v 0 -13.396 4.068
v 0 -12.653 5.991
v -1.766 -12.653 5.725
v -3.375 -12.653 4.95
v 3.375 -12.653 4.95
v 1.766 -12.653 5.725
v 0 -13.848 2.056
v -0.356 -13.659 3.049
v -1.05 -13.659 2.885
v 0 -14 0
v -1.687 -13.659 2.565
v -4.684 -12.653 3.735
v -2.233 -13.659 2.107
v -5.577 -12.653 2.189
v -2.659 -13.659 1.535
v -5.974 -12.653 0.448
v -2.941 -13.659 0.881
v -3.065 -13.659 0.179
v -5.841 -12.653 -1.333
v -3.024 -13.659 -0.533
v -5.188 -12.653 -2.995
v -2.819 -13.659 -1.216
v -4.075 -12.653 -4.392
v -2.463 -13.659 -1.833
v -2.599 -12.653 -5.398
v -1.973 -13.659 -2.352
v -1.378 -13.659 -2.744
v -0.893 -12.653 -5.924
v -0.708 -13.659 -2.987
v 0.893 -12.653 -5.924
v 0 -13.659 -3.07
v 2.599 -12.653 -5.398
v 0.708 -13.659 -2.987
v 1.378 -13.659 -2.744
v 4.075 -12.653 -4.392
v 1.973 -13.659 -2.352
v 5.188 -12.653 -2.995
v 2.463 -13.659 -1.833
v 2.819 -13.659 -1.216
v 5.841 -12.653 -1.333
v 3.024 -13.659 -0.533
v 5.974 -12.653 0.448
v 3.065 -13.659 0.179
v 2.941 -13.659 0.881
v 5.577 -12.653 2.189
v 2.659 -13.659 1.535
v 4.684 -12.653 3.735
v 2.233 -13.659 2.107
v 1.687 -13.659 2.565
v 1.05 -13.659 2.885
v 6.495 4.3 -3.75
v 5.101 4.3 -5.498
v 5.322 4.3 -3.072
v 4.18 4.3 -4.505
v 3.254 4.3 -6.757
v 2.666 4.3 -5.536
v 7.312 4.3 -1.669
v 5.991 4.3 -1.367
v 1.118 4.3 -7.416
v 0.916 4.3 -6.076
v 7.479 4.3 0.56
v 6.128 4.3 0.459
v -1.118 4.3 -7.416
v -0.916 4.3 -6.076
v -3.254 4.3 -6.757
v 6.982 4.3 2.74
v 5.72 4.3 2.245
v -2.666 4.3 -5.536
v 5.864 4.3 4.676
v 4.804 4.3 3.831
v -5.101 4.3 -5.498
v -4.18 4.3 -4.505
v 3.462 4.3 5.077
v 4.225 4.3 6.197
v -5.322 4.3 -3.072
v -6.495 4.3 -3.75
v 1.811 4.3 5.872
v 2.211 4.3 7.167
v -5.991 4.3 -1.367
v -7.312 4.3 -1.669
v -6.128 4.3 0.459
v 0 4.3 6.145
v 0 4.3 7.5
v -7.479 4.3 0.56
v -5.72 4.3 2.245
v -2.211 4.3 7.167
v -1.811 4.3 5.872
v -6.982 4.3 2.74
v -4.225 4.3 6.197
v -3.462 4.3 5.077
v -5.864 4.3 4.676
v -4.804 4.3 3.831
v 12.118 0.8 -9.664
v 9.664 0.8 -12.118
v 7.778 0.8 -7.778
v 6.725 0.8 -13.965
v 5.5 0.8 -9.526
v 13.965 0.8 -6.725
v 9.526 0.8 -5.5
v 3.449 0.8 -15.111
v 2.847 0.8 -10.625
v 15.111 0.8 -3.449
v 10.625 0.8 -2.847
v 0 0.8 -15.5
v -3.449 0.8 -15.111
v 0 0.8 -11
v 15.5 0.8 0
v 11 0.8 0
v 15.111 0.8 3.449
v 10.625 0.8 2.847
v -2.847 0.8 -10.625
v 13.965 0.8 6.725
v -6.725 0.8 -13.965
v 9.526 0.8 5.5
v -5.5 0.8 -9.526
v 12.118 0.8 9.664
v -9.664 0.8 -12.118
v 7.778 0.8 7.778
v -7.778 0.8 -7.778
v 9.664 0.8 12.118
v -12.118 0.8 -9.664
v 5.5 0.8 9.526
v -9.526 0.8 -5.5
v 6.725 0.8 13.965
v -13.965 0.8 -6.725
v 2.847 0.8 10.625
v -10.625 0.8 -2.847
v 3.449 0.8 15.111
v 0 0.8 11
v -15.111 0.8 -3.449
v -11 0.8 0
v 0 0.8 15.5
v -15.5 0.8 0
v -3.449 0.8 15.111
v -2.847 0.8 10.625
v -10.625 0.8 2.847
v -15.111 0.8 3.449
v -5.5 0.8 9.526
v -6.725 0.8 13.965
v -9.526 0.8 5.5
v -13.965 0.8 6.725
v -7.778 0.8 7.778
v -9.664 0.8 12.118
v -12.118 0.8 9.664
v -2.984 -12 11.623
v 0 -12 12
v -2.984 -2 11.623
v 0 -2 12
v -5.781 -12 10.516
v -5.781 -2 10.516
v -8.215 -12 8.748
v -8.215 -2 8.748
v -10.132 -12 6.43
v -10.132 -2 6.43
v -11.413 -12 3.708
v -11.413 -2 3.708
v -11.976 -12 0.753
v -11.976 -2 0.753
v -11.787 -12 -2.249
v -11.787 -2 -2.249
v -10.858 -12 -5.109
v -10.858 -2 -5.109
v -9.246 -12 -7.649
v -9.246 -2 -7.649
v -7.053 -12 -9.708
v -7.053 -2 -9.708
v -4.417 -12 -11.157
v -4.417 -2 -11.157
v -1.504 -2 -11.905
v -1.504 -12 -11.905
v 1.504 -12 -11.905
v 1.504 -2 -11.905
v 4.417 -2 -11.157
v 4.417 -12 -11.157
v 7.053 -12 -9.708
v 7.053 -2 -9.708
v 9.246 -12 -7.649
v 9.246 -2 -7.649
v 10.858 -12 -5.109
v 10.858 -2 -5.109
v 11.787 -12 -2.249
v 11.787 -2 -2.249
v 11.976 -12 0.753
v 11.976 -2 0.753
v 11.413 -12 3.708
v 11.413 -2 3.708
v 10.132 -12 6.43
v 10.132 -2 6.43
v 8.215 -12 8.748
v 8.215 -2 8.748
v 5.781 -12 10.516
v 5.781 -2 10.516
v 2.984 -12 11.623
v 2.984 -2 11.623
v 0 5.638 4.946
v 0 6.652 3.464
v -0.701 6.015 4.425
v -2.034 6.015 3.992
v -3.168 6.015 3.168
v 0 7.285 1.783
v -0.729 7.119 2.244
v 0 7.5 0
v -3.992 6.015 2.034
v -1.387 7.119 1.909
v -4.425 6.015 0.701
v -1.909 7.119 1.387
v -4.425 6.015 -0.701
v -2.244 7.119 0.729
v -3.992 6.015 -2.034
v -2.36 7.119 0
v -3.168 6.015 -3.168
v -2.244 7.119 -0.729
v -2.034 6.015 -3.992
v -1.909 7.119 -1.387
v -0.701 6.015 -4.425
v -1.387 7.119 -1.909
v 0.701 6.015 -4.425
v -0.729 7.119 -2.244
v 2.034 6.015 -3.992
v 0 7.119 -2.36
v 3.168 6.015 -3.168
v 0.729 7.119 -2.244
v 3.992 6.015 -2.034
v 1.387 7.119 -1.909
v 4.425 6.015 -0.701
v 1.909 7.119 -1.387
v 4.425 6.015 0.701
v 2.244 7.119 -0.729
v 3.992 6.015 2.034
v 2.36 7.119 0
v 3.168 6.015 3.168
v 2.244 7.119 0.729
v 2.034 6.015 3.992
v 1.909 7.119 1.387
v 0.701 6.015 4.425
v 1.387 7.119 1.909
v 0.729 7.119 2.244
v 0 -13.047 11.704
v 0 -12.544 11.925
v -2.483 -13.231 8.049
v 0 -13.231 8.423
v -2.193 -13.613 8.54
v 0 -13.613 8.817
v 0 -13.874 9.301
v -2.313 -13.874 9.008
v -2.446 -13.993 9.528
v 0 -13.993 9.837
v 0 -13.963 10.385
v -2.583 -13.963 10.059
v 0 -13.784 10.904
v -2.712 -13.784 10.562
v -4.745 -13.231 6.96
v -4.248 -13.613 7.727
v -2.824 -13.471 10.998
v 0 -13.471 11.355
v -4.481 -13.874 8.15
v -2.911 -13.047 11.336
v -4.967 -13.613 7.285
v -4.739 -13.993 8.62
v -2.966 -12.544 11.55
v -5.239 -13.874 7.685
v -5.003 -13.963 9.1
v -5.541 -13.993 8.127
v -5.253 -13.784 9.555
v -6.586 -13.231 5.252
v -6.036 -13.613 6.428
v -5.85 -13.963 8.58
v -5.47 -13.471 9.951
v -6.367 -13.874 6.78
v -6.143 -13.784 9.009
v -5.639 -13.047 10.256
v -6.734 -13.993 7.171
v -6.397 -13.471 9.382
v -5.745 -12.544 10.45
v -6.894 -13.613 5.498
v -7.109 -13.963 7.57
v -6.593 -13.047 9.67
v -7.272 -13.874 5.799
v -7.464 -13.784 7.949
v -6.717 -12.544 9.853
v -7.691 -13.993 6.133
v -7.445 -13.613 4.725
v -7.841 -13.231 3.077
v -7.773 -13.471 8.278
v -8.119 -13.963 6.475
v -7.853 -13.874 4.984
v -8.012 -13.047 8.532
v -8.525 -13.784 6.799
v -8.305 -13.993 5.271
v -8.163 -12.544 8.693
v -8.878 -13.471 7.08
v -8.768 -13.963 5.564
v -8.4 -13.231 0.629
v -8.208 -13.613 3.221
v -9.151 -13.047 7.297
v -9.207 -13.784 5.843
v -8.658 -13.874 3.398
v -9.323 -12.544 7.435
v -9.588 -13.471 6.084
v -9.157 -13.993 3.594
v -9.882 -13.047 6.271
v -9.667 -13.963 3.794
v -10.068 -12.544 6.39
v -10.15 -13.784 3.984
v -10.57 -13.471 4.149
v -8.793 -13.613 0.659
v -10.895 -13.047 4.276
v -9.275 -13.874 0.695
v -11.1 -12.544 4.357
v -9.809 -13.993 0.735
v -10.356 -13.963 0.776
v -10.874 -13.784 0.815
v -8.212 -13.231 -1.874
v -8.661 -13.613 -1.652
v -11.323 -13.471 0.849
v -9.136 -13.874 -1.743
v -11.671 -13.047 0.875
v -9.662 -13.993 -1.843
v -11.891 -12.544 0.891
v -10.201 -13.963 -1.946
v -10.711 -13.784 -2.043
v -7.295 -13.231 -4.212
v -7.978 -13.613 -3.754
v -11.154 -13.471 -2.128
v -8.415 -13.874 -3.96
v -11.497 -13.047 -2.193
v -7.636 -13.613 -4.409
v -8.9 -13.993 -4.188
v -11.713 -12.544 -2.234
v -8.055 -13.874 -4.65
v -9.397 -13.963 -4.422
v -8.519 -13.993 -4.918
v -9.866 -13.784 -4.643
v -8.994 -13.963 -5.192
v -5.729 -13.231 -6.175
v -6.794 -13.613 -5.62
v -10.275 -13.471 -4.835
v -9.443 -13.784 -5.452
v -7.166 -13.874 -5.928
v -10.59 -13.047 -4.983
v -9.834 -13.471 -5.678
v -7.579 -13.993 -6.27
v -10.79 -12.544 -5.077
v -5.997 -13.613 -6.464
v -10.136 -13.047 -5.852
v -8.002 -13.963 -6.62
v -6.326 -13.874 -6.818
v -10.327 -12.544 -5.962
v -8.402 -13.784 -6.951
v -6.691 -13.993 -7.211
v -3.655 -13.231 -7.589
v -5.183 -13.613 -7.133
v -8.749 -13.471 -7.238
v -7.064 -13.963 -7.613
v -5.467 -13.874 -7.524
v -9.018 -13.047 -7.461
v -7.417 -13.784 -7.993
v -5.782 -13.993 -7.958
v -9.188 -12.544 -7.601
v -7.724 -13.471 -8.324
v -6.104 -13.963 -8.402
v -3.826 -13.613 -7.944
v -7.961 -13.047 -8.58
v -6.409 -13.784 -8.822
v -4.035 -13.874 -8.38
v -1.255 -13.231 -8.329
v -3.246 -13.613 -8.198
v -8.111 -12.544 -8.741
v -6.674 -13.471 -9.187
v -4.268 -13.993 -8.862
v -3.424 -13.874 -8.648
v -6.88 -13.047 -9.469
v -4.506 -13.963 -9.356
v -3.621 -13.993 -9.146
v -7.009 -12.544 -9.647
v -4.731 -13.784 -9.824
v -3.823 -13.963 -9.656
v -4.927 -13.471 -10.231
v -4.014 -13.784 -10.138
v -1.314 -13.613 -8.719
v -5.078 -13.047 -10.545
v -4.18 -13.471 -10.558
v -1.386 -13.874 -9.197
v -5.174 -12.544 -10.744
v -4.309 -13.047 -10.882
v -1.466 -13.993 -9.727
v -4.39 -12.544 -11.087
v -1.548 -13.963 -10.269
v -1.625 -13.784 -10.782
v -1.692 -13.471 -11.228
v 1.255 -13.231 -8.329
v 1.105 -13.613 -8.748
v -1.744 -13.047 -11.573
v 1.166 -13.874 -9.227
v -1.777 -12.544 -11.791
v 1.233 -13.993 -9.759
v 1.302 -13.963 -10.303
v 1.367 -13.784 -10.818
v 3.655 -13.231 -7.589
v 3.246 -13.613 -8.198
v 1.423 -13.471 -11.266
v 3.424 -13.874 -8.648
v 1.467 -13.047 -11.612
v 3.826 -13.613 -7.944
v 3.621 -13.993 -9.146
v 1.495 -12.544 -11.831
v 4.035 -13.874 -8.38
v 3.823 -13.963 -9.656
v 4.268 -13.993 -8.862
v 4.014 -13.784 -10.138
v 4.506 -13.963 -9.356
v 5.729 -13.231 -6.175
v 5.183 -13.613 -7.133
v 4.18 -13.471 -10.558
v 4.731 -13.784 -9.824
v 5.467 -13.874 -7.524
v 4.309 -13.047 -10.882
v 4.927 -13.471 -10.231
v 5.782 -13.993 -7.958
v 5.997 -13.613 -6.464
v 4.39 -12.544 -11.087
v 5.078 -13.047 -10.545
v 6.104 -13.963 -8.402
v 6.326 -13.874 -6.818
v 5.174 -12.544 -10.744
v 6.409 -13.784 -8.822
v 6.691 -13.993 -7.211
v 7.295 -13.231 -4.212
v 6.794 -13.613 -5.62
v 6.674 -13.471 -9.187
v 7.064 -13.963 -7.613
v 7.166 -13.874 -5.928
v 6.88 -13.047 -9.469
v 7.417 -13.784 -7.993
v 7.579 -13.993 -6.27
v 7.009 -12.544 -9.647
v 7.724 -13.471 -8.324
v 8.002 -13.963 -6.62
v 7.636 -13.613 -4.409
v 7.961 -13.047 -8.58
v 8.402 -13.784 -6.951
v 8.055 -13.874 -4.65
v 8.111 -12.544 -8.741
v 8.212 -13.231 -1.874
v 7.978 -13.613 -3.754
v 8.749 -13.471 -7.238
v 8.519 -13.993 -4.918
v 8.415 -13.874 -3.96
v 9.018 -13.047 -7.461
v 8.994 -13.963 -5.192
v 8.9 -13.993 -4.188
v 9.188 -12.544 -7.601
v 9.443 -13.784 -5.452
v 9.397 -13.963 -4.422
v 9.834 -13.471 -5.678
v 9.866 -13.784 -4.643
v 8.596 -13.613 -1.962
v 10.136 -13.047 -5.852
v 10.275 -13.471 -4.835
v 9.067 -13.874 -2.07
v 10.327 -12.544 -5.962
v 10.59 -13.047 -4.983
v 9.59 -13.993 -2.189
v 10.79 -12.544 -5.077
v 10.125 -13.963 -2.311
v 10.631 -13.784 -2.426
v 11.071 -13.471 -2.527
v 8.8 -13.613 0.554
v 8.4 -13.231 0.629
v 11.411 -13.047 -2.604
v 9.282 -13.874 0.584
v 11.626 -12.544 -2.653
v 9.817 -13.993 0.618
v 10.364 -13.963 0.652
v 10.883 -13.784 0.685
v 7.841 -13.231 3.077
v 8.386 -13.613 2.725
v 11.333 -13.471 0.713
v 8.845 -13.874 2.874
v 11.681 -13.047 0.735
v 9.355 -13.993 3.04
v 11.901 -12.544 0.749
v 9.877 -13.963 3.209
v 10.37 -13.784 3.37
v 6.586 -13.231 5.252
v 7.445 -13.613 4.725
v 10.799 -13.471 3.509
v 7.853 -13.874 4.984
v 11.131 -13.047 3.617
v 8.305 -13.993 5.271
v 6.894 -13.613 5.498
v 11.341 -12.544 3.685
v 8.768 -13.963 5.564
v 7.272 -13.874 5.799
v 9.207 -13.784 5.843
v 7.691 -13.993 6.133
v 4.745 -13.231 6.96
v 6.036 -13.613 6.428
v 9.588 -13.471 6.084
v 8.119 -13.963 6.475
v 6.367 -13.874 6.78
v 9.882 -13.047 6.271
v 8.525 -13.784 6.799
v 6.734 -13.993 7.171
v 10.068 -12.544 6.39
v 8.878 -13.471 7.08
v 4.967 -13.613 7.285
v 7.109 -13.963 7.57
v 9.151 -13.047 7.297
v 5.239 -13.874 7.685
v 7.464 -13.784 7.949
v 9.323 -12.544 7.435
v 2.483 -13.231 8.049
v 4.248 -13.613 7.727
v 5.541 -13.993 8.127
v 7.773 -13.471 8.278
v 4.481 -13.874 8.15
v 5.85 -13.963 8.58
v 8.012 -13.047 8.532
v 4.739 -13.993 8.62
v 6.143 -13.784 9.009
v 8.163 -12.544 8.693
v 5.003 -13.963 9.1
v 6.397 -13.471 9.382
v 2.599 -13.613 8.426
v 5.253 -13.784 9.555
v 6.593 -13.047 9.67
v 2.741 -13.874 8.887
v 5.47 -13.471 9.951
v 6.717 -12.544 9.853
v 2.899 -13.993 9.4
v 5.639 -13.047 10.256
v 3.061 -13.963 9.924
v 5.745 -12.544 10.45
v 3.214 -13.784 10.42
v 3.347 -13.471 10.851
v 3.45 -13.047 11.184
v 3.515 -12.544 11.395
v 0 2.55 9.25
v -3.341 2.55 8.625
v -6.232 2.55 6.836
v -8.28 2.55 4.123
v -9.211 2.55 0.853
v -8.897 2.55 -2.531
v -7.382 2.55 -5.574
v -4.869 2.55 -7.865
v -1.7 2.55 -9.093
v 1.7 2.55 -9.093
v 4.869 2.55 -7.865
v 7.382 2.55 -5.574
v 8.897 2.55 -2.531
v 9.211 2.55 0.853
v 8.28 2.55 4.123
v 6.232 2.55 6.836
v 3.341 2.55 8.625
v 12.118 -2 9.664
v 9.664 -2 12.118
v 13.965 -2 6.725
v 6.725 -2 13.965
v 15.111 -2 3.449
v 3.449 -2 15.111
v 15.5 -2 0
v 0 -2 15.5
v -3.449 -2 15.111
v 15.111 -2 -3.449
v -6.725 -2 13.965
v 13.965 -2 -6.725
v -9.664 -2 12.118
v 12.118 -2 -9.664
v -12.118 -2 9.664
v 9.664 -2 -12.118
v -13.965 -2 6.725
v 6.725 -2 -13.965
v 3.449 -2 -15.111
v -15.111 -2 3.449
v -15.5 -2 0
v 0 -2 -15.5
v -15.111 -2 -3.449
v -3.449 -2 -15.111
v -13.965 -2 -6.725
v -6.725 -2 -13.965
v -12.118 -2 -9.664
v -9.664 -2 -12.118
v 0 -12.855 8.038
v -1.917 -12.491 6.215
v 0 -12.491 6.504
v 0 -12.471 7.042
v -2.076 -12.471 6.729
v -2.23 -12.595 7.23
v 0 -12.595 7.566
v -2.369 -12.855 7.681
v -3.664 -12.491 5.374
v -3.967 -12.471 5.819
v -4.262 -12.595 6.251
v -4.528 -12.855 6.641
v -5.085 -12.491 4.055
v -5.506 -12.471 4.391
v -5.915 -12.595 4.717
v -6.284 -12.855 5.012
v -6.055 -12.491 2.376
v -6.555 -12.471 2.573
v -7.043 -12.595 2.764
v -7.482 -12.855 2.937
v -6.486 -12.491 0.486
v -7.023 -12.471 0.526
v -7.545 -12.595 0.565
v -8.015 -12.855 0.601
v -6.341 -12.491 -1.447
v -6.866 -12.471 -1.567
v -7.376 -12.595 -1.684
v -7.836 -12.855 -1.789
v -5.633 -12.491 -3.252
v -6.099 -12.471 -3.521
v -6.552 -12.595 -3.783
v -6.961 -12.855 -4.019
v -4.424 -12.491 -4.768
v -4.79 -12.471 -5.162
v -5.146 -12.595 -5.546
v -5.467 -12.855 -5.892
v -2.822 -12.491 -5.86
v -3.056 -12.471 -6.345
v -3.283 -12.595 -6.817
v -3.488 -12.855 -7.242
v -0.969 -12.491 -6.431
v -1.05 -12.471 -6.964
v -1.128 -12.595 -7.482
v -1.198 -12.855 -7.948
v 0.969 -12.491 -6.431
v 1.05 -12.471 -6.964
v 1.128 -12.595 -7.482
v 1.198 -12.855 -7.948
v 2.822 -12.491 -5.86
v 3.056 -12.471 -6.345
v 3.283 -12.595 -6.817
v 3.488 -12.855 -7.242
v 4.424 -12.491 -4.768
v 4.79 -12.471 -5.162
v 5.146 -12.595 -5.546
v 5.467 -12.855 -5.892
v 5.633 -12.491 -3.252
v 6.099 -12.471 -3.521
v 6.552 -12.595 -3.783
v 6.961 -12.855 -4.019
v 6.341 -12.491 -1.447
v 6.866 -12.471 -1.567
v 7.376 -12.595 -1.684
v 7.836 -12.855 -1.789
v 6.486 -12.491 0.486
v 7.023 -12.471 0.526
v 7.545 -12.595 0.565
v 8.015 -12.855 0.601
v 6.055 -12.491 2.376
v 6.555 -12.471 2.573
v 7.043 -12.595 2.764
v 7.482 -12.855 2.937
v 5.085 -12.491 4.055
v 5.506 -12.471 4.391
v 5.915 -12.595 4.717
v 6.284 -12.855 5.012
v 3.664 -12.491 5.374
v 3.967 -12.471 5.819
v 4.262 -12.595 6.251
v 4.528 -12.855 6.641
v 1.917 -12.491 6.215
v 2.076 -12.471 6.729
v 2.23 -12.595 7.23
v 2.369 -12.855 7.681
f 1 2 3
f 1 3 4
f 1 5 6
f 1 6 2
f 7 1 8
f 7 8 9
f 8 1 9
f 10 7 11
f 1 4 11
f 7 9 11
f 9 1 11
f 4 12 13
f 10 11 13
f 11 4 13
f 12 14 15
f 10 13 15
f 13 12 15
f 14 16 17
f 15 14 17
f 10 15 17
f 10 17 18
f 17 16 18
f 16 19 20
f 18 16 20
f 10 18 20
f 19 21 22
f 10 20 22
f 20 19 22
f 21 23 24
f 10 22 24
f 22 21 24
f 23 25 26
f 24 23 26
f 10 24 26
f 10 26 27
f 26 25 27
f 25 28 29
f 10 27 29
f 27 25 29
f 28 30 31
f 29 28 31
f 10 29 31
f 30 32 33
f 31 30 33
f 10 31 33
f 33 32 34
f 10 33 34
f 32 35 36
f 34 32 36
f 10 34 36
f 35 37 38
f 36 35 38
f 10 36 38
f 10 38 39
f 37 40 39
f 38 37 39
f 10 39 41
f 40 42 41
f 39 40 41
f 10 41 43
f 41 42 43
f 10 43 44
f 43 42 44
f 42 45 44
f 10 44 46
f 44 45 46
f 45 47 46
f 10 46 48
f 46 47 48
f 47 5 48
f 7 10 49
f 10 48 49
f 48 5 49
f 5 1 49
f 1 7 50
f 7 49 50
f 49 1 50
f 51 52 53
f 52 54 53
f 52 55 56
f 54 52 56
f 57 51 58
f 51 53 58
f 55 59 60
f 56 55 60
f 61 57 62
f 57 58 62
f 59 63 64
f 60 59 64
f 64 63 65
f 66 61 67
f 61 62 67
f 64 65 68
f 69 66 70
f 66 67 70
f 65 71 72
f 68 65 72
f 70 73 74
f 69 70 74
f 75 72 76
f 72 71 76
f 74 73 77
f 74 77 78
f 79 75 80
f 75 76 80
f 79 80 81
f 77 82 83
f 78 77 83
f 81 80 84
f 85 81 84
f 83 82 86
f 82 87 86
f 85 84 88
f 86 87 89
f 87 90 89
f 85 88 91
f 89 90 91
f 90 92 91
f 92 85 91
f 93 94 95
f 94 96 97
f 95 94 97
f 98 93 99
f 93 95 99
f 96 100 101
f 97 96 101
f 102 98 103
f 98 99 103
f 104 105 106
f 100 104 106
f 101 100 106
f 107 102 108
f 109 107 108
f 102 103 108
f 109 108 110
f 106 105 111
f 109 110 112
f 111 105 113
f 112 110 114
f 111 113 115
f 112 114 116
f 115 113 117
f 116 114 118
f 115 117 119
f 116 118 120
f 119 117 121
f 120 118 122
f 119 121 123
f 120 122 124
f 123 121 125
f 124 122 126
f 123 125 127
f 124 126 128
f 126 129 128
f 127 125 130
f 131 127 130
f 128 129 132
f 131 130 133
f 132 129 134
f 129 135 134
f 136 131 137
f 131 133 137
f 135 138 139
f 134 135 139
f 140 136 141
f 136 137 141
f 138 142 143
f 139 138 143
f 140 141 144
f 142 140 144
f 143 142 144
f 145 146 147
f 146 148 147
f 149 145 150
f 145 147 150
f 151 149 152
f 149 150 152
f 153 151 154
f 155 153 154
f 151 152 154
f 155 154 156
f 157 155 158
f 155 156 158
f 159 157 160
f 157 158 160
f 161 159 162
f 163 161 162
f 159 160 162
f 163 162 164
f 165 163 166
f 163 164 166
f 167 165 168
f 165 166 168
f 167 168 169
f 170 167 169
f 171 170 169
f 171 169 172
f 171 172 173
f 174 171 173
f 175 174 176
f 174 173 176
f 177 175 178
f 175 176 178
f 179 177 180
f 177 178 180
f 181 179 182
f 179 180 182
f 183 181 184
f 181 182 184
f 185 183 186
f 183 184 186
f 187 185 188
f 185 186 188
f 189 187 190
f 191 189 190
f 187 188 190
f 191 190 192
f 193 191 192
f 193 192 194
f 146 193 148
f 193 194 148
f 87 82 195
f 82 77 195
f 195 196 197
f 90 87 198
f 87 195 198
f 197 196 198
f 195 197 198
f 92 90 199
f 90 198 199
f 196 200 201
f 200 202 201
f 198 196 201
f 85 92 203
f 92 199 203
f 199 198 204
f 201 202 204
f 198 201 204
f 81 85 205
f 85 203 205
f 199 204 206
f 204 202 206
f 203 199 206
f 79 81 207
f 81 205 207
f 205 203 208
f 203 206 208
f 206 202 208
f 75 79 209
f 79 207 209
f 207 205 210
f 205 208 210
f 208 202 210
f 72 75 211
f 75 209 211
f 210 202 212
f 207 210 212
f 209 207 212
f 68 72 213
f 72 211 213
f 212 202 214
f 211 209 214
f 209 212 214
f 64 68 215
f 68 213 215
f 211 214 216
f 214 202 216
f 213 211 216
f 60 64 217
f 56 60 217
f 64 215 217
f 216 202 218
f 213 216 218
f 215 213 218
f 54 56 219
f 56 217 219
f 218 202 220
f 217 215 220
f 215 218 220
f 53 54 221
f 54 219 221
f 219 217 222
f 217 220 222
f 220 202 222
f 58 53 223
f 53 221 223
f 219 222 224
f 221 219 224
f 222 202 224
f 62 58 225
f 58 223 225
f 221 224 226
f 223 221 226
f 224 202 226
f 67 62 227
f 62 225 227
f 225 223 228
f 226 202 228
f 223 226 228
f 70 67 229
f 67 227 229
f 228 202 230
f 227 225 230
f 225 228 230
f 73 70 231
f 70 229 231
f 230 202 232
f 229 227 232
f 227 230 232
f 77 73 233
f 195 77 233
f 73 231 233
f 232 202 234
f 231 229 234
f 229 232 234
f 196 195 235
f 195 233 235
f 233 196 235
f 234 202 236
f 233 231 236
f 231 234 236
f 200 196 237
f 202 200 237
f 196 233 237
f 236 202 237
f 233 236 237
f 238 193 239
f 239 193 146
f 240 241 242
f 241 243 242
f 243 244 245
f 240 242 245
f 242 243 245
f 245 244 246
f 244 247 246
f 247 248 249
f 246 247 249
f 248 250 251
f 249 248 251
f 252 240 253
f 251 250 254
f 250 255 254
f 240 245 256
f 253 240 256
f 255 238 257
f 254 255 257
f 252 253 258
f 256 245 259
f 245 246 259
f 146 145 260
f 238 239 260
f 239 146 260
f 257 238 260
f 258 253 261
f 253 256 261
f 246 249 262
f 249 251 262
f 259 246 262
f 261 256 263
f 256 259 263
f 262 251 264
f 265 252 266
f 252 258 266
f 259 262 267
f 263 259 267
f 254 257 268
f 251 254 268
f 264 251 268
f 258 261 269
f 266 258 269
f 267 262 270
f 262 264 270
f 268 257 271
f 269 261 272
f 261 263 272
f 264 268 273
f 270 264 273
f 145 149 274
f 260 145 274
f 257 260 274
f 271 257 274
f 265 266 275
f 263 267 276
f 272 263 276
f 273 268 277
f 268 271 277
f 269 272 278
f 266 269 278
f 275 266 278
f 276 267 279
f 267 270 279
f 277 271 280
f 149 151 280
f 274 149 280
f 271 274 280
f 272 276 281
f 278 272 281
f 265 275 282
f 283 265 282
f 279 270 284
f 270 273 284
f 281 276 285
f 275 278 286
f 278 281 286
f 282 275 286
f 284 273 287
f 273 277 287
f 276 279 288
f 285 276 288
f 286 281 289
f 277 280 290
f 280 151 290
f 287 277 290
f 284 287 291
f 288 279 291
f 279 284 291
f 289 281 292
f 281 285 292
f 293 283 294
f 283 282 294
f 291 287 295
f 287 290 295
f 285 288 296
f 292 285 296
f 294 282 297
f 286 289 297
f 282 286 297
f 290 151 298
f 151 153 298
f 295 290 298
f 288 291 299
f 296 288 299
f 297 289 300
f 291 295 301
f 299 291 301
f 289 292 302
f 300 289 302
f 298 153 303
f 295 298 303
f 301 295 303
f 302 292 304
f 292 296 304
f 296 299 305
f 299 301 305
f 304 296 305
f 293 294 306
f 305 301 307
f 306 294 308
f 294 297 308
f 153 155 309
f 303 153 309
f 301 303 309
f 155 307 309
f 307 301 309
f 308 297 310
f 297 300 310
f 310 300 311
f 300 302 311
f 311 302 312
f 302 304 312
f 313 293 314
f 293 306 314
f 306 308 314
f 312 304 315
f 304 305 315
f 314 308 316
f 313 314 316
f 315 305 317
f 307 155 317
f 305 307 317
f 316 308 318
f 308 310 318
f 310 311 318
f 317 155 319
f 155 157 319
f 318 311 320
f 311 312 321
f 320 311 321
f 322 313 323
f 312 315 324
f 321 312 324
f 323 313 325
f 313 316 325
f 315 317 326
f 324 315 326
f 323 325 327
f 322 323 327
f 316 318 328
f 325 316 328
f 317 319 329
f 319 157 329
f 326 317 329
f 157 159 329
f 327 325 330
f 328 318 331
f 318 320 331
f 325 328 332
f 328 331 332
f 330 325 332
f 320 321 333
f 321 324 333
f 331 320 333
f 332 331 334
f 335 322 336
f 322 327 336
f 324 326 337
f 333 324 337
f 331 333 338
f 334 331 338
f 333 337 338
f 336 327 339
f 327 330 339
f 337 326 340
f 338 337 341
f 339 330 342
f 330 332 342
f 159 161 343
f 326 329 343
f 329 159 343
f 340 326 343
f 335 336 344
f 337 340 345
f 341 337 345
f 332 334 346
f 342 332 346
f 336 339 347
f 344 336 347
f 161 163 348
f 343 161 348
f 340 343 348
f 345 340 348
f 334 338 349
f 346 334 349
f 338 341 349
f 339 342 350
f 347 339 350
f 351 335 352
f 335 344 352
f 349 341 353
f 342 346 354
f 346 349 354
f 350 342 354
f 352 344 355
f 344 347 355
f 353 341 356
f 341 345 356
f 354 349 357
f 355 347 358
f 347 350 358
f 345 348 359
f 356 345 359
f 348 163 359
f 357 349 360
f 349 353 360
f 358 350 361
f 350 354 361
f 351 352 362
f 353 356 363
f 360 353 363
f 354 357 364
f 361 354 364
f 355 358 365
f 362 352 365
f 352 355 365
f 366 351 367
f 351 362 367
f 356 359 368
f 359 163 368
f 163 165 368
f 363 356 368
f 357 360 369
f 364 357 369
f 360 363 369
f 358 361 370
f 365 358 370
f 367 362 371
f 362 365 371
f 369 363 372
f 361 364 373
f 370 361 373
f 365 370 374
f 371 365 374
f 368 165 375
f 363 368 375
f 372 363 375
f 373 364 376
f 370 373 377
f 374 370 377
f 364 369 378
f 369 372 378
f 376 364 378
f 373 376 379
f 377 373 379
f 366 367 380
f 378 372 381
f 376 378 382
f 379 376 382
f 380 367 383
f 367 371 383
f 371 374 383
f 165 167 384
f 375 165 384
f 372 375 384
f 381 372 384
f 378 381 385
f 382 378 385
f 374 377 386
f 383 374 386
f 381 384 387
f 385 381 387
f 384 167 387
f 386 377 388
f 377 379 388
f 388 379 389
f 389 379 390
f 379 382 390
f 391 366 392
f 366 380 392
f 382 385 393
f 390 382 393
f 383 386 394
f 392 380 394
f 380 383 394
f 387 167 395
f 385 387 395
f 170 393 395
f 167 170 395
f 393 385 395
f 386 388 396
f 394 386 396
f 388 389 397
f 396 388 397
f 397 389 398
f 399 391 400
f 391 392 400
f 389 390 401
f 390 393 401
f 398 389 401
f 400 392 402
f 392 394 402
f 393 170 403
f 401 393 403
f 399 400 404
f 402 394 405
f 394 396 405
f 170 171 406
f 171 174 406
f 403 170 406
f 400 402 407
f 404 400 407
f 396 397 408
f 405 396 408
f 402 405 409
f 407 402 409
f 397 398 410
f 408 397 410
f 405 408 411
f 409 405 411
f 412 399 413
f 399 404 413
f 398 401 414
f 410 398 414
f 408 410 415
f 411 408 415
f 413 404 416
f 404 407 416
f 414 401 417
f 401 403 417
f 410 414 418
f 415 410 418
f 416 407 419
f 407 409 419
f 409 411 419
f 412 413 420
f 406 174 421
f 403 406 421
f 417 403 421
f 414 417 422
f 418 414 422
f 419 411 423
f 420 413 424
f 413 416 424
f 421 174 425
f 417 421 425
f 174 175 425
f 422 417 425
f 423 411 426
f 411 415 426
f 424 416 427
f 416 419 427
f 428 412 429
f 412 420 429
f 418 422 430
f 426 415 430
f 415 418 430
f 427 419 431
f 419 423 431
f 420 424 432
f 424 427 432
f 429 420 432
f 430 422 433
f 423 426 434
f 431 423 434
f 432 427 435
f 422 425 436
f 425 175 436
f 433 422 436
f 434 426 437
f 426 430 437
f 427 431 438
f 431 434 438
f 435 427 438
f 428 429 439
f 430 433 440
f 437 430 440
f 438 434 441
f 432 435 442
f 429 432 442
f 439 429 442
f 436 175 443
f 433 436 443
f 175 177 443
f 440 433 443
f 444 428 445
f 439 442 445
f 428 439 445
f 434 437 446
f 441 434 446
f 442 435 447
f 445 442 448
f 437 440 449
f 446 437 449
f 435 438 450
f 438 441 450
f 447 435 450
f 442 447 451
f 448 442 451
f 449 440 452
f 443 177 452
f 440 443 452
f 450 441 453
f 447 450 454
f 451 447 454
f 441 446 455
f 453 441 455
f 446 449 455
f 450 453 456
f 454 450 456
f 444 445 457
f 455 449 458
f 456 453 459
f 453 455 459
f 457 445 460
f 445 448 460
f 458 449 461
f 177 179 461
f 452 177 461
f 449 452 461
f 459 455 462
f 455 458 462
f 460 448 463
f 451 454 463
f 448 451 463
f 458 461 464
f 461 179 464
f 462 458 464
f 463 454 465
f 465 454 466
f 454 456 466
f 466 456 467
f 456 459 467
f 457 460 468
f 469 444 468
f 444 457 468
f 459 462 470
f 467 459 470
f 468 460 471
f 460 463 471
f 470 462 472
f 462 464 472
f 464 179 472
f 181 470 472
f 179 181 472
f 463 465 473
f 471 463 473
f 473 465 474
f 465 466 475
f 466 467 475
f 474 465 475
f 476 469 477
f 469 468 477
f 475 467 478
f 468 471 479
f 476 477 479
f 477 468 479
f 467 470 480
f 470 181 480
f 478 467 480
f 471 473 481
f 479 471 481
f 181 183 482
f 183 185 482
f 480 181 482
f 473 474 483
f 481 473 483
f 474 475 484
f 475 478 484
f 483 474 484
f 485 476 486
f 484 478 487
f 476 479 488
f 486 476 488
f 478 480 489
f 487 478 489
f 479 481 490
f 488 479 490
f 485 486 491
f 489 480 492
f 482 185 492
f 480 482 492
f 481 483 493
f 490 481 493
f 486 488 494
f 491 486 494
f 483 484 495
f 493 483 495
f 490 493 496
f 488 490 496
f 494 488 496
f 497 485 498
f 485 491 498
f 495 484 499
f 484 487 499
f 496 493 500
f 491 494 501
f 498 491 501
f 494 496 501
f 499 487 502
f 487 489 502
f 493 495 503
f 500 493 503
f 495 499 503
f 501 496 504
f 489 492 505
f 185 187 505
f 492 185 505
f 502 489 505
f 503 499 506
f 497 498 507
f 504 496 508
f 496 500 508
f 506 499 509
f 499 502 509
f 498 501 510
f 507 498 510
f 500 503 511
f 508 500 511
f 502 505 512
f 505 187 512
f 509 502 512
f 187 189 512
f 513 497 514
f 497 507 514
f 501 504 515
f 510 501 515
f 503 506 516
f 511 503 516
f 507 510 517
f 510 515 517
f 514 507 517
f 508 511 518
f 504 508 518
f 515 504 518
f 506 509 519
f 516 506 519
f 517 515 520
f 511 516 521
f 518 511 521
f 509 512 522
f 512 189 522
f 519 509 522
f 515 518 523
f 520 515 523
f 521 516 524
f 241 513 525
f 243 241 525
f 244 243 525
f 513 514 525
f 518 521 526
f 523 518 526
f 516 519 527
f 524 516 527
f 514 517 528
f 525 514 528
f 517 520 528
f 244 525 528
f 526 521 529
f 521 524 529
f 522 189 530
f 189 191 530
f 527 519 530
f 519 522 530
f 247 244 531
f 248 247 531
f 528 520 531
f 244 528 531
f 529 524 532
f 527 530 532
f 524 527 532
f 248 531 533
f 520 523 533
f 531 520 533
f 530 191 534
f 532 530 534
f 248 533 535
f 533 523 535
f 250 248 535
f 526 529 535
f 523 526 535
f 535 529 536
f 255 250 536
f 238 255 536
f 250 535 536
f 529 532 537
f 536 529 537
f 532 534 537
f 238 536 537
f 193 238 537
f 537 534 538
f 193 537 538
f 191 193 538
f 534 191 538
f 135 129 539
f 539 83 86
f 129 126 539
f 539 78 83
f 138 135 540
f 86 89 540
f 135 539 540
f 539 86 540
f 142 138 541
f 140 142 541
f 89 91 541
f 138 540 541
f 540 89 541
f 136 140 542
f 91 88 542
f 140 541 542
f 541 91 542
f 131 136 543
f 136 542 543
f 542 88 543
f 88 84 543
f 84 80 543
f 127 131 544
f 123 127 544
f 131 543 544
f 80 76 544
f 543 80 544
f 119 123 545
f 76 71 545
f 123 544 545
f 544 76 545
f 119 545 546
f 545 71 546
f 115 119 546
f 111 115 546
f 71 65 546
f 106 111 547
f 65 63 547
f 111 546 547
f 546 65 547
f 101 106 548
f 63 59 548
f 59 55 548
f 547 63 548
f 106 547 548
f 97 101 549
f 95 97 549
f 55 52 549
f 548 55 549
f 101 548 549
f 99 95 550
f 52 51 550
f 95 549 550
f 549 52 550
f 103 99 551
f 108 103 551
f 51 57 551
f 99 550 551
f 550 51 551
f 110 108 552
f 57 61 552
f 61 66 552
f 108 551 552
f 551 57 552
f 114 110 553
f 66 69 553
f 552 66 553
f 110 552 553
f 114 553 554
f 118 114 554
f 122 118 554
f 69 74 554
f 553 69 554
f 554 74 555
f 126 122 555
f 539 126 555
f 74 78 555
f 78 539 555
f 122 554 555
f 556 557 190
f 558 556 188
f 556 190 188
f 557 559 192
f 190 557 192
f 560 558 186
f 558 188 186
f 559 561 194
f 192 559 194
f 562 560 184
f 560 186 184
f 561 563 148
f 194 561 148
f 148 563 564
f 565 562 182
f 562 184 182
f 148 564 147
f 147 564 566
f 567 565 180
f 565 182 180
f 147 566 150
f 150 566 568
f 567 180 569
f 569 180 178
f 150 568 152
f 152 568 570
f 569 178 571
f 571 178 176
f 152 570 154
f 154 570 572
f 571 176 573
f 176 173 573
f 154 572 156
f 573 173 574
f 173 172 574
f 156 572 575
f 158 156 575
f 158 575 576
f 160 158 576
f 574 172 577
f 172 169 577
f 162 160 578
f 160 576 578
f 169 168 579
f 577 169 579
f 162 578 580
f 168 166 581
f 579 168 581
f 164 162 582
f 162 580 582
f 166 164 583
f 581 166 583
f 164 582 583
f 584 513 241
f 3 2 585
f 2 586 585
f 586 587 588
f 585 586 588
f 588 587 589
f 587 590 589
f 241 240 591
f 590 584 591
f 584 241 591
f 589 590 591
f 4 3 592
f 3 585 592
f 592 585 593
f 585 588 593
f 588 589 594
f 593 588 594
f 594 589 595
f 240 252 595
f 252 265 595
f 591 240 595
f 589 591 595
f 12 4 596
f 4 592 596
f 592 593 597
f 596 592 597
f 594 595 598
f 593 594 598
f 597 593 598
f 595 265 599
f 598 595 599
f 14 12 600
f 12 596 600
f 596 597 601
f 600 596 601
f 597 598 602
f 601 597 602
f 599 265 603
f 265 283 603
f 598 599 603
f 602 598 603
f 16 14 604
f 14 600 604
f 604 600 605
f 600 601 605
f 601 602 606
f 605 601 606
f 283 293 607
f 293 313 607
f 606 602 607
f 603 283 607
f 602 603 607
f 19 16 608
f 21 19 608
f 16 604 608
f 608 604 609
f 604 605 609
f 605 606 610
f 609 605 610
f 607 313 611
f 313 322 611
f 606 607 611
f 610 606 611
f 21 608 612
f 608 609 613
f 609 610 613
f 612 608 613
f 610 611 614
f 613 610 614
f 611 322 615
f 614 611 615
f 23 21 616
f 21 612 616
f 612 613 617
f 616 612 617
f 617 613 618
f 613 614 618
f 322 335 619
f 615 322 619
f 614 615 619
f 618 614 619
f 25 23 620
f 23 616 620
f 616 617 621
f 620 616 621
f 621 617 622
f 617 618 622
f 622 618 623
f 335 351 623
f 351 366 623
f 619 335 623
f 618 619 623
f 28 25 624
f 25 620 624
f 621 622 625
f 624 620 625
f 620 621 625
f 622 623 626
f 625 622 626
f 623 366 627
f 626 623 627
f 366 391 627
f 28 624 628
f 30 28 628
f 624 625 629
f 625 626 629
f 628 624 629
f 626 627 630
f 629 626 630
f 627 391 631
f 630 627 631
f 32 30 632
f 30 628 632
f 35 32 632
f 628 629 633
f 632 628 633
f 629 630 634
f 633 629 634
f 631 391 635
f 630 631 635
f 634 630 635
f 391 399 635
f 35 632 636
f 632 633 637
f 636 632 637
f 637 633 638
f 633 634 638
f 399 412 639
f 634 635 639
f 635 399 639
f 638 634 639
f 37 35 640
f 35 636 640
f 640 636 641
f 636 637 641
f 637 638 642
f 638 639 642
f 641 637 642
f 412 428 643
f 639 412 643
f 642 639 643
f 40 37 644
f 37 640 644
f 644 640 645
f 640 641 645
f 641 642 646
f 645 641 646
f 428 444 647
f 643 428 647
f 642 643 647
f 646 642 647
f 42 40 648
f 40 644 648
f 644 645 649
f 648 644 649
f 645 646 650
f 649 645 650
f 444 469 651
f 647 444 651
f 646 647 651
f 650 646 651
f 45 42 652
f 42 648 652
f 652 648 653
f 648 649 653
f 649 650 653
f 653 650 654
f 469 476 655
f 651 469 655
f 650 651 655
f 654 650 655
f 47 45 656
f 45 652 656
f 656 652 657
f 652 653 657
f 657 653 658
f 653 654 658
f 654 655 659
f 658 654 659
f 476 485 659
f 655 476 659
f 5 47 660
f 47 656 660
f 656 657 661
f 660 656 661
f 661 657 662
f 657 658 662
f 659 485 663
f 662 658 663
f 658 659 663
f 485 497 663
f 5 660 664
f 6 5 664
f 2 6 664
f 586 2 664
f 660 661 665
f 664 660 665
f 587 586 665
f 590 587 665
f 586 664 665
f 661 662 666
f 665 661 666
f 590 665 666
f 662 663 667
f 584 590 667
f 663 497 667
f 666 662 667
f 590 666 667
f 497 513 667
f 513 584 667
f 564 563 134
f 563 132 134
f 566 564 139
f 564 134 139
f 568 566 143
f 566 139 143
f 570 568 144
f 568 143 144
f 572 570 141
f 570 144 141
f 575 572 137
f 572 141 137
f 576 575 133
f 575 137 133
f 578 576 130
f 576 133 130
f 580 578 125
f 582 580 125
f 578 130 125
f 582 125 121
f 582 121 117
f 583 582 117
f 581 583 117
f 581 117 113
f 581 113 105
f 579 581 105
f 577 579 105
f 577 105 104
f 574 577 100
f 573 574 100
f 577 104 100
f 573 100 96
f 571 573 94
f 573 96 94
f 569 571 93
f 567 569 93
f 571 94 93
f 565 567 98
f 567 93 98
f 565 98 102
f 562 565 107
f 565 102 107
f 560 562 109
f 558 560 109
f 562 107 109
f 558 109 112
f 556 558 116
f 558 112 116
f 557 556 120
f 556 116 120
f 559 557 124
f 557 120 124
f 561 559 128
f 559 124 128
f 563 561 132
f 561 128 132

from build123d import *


with BuildPart() as part:
    # Esquisse1 → Révolution1 (revolve)
    with BuildSketch(Plane.XY, mode=Mode.PRIVATE) as r_volution1_sk:
        with BuildLine():
            Line((-12, -2), (-15.5, -2))
            Line((-15.5, -2), (-15.5, 0.8))
            Line((-15.5, 0.8), (-11, 0.8))
            Line((-11, 0.8), (-7.5, 4.3))
            Line((-7.5, 4.3), (-6.144916598, 4.3))
            ThreePointArc((-6.144916598, 4.3), (-3.464101615, 6.652067348), (0, 7.5))
            Line((0, 7.5), (0, -14))
            ThreePointArc((0, -14), (-3.070175628, -13.659210139), (-5.990882009, -12.653431659))
            ThreePointArc((-5.990882009, -12.653431659), (-7.30840287, -12.515081442), (-8.423361148, -13.230532377))
            ThreePointArc((-8.423361148, -13.230532377), (-10.650662084, -13.891200373), (-12, -12))
            Line((-12, -12), (-12, -2))
        make_face()
    revolve(r_volution1_sk.sketch.rotate(Axis((0, 7.5, 0), (0, -1, 0)), 270), axis=Axis((0, 7.5, 0), (0, -1, 0)))


solid = part.part
